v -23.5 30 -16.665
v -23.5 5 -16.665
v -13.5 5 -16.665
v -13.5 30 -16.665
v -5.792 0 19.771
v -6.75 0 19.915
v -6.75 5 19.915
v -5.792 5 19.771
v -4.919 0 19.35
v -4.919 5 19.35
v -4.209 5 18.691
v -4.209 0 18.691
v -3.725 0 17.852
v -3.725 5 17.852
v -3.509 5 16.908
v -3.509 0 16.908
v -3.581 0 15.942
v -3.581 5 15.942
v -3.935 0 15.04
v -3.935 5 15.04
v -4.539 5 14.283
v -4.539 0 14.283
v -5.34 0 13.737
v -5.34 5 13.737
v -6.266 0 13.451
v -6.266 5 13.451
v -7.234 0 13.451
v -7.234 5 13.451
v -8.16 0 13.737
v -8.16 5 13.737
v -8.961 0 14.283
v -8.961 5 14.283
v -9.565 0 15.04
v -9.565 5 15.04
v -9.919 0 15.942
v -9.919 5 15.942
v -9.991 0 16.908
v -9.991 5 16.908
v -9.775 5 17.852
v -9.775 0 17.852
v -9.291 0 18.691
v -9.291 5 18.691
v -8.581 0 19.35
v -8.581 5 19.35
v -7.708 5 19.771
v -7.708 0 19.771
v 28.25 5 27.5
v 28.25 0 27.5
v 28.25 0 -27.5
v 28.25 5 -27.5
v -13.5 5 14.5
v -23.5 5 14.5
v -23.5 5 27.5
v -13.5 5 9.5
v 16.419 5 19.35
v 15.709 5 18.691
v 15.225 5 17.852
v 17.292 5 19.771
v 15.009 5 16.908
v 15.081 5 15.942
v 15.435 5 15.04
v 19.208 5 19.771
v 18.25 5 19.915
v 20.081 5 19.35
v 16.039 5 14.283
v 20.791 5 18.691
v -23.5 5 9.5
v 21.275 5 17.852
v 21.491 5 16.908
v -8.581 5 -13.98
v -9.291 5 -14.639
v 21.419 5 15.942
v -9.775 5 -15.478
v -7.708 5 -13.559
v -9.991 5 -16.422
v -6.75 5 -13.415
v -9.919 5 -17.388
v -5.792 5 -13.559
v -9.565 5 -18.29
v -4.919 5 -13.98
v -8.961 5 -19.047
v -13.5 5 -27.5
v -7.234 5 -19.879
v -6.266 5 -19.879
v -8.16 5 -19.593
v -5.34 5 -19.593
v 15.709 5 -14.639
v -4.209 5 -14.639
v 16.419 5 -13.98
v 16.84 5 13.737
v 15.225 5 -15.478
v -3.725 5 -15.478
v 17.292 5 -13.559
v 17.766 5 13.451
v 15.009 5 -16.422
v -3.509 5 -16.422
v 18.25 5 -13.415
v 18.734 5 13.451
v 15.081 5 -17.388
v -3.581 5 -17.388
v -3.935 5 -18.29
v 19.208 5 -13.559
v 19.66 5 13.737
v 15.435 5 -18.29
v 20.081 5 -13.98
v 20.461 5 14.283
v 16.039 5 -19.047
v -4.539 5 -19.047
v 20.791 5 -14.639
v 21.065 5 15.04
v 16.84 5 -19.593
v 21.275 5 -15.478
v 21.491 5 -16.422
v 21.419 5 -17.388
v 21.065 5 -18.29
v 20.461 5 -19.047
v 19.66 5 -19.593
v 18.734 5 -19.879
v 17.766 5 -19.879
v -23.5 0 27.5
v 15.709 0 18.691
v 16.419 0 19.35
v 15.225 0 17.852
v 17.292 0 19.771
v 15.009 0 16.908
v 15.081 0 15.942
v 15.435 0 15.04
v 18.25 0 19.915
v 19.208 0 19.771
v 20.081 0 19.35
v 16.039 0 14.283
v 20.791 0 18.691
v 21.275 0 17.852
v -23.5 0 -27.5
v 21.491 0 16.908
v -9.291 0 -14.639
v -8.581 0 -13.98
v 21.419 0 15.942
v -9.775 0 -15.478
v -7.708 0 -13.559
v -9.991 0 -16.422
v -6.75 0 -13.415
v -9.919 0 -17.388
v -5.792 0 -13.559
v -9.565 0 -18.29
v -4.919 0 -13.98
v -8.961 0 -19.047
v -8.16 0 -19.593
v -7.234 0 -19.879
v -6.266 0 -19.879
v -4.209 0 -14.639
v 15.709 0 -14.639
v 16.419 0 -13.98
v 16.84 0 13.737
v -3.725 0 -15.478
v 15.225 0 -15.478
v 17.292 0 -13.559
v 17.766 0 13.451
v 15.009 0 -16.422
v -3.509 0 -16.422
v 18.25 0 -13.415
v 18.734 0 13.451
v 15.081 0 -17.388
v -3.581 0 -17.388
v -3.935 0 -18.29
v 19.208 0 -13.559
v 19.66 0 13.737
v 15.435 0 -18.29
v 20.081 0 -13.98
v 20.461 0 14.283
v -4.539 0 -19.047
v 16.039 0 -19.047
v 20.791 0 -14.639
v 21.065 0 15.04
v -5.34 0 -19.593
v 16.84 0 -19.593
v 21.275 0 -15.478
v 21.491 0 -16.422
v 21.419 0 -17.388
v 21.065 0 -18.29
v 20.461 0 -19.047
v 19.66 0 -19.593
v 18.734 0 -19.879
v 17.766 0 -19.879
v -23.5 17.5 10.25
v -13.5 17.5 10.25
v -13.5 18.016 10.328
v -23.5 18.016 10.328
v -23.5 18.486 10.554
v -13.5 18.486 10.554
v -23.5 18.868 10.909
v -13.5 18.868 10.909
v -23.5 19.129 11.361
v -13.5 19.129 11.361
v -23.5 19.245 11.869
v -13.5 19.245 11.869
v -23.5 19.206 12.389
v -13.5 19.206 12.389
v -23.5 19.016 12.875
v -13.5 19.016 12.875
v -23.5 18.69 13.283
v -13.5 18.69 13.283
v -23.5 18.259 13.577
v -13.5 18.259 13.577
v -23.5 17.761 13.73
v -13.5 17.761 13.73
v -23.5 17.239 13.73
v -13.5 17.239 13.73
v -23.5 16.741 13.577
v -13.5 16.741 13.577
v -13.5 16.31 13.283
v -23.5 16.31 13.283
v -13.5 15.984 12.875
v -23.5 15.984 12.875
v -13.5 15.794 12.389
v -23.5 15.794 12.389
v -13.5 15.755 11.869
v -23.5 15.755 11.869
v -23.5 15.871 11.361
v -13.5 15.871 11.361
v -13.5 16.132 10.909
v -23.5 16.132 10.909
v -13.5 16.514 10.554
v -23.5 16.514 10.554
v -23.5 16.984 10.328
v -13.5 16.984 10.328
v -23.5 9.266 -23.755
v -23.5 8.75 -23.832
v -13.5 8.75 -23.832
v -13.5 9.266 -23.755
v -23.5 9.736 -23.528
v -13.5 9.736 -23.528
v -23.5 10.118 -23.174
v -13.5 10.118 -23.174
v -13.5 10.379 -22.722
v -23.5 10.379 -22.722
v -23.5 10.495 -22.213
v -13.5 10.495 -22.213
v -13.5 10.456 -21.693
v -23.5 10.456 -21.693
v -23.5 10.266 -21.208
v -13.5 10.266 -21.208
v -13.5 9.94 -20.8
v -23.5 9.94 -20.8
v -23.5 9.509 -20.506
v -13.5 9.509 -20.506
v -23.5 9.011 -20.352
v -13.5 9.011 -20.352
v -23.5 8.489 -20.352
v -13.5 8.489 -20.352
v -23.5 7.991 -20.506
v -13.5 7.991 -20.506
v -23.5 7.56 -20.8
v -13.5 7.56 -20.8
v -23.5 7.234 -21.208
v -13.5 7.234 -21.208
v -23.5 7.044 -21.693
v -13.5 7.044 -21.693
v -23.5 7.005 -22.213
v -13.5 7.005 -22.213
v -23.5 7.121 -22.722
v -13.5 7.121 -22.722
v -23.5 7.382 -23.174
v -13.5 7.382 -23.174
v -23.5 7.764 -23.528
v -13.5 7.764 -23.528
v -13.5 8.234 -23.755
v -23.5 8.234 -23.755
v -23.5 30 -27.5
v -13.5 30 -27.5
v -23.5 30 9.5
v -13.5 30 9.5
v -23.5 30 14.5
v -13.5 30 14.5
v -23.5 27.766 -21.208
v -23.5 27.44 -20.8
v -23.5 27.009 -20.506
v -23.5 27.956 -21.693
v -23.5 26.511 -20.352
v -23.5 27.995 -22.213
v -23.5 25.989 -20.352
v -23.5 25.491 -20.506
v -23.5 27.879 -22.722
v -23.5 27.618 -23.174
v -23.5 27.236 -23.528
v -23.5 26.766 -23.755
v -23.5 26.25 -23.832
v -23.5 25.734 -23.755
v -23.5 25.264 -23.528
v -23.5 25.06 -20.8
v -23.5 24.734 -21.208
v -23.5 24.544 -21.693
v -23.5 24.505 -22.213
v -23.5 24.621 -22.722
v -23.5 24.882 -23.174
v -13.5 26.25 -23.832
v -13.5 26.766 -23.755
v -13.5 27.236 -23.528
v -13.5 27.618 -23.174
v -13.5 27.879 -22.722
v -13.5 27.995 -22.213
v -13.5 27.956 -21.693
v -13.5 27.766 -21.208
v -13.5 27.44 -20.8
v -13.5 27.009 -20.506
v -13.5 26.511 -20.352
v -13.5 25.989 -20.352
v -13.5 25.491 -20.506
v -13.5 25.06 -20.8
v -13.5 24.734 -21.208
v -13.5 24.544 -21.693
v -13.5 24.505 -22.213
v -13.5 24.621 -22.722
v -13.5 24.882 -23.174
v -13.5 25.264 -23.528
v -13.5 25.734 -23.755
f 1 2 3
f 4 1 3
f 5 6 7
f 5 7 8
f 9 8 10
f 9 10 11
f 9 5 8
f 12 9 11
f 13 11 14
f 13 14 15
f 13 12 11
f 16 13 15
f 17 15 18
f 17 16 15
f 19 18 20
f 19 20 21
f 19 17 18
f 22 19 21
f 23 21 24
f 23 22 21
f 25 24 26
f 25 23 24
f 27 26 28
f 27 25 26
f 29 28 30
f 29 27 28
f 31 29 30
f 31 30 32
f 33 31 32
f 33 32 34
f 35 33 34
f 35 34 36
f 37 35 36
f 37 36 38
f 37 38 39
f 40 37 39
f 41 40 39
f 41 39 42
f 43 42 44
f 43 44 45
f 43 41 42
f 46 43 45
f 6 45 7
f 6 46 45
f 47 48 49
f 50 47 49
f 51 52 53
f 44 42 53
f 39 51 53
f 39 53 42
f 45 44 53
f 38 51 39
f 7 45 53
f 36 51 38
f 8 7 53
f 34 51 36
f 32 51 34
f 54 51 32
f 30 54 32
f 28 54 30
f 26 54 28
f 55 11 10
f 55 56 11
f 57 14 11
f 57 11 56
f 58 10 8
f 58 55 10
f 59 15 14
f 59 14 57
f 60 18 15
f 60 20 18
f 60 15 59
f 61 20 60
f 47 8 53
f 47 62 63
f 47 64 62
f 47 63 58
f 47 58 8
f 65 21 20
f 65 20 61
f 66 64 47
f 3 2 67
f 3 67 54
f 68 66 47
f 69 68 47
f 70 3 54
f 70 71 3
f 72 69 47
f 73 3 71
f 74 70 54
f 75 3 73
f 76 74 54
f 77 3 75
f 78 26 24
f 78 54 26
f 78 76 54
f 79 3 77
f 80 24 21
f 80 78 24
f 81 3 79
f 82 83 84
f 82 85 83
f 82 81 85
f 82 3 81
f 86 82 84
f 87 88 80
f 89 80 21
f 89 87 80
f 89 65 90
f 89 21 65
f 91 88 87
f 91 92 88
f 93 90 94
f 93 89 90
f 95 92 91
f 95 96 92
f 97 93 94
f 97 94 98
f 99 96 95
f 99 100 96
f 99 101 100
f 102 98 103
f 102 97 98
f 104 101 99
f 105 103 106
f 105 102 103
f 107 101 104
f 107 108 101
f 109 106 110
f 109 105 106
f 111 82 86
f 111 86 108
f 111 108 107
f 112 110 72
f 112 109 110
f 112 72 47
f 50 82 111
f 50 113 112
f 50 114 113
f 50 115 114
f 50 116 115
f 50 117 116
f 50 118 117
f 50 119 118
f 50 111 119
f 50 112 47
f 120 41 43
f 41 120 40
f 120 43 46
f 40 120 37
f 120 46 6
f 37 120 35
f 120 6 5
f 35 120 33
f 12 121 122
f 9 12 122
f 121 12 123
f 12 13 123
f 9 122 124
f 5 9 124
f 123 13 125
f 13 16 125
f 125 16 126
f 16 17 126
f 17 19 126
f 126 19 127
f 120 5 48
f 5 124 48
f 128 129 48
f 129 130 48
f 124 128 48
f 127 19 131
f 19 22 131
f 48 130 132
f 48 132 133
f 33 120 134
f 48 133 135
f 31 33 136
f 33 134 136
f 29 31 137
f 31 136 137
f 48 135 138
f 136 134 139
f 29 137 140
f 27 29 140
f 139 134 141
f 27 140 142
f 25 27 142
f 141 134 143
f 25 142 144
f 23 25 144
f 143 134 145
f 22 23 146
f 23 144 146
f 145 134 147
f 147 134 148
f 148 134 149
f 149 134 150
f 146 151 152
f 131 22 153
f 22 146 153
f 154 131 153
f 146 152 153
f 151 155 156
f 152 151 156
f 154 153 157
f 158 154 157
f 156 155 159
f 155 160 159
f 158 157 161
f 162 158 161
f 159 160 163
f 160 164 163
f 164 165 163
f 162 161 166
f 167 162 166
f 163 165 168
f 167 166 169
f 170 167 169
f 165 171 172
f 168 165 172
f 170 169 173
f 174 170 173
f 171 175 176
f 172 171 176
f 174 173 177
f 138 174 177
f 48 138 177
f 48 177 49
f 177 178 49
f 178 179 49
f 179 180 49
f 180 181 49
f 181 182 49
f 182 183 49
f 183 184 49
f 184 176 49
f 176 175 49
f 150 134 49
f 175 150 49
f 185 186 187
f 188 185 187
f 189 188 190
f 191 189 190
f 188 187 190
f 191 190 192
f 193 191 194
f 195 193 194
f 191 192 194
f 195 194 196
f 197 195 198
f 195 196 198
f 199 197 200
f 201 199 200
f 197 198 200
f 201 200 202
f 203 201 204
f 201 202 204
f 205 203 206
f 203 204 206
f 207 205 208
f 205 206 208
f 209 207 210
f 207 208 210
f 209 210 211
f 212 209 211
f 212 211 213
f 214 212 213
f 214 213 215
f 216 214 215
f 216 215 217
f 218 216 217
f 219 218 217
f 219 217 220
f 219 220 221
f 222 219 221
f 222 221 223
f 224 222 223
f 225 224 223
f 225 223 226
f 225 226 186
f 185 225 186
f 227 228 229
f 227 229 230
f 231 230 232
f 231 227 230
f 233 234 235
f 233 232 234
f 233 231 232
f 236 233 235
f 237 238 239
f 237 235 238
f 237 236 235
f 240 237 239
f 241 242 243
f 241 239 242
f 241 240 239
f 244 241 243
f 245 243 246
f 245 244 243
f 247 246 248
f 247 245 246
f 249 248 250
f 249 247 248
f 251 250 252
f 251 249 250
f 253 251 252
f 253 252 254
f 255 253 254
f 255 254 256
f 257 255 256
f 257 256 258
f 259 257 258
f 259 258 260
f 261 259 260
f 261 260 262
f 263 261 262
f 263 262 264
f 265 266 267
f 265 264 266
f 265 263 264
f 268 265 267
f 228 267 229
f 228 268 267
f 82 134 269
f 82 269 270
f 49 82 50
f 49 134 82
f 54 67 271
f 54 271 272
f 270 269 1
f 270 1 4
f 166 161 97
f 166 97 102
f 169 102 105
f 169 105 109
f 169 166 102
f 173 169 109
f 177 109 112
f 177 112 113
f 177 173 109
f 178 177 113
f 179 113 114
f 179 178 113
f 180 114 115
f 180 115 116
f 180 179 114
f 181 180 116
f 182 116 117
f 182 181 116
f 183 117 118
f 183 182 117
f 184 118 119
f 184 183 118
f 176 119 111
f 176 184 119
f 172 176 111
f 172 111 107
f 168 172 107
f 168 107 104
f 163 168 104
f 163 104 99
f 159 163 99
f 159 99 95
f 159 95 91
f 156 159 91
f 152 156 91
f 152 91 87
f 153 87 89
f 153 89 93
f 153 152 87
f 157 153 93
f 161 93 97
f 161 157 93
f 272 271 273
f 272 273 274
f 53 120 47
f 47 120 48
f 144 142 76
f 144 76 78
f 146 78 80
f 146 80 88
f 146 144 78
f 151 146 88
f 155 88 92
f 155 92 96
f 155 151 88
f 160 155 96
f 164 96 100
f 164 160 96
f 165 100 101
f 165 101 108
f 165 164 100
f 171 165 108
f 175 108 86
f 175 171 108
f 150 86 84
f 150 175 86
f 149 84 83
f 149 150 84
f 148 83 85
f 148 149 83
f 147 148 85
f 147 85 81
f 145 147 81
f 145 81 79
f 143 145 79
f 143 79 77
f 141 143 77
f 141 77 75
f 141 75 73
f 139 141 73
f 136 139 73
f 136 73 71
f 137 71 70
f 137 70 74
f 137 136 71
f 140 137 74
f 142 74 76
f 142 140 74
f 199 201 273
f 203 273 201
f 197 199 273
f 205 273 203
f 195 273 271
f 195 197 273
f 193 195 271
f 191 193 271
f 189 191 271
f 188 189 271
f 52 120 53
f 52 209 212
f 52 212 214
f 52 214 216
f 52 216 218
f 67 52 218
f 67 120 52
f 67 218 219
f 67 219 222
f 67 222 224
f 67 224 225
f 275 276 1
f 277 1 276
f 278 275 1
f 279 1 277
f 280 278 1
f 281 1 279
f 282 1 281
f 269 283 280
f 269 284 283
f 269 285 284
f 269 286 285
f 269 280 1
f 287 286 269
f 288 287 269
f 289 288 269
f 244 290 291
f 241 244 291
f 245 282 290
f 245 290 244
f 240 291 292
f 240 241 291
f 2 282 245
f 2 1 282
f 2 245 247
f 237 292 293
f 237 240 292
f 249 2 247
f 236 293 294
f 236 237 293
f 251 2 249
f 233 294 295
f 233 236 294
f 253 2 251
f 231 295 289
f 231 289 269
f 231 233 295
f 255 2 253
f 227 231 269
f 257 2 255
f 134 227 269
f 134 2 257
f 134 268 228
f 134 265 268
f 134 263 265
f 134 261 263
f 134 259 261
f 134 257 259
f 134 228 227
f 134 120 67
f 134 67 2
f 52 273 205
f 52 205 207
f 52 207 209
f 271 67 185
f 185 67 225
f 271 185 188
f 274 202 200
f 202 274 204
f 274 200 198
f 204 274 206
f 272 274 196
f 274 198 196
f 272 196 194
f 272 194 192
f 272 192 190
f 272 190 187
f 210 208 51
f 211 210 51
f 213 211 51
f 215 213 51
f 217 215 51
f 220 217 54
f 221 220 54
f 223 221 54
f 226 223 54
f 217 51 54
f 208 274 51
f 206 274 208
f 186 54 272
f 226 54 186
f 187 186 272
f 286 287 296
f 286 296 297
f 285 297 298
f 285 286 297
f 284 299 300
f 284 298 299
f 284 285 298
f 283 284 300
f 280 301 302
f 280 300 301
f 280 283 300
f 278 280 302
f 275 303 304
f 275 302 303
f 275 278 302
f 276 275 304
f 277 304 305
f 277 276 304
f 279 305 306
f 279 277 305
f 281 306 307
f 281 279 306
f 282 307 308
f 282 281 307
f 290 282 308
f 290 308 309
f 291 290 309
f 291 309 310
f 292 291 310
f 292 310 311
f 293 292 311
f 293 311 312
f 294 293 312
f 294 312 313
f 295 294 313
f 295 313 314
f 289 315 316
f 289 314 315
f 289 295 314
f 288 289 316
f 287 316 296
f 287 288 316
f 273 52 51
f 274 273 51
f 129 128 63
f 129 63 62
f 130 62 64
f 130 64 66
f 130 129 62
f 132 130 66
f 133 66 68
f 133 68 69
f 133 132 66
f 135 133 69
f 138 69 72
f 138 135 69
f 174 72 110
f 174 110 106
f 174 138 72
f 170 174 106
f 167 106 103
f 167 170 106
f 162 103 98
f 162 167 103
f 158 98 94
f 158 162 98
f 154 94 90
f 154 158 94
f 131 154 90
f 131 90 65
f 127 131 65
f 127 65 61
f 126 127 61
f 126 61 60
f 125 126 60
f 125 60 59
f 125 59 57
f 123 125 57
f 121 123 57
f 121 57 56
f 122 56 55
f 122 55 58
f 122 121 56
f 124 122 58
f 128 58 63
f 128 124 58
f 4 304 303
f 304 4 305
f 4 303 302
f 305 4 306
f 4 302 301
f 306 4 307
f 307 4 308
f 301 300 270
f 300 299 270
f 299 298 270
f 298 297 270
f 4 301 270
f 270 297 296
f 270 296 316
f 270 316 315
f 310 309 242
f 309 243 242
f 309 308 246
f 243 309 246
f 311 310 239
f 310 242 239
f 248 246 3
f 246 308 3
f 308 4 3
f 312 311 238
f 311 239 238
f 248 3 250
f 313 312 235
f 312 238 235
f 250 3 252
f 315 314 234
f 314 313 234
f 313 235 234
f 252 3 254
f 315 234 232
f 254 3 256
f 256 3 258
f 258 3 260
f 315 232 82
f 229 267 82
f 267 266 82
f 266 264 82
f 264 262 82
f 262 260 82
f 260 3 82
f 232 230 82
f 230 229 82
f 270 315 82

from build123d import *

# Parameters (mm, degrees)
SKETCH1_W               = 51.75
SKETCH1_H               = 55
SKETCH1_R               = 3.25
BOSS_EXTRUDE2_DEPTH     = 5
SKETCH1_6_W             = 10
SKETCH1_6_H             = 10.835
SKETCH1_6_H_2           = 5
BOSS_EXTRUDE3_DEPTH     = 30
CUT_EXTRUDE1_DEPTH      = 59.303623387
CUT_EXTRUDE1_DEPTH_BACK = 59.303623387
SKETCH4_R               = 1.75
SKETCH3_R               = 1.75
CUT_EXTRUDE2_DEPTH      = 59.303623387


with BuildPart() as part:
    # Sketch1 → Boss-Extrude2 (new body)
    with BuildSketch(Plane(origin=(0, 0, 0), x_dir=(1, 0, 0), z_dir=(0, 1, 0))):
        with Locations((2.375, 0)):
            Rectangle(SKETCH1_W, SKETCH1_H)
        with Locations((18.25, 16.665)):
            Circle(SKETCH1_R, mode=Mode.SUBTRACT)
        with Locations((-6.75, -16.665)):
            Circle(SKETCH1_R, mode=Mode.SUBTRACT)
        with Locations((18.25, -16.665)):
            Circle(SKETCH1_R, mode=Mode.SUBTRACT)
        with Locations((-6.75, 16.665)):
            Circle(SKETCH1_R, mode=Mode.SUBTRACT)
    extrude(amount=BOSS_EXTRUDE2_DEPTH)

    # Sketch1<6> → Boss-Extrude3 (add)
    with BuildSketch(Plane(origin=(0, 0, 0), x_dir=(1, 0, 0), z_dir=(0, 1, 0))):
        with Locations((-18.5, 22.0825)):
            Rectangle(SKETCH1_6_W, SKETCH1_6_H)
        with Locations((-18.5, -12)):
            Rectangle(SKETCH1_6_W, SKETCH1_6_H_2)
    extrude(amount=BOSS_EXTRUDE3_DEPTH)

    # Sketch4 → Cut-Extrude1 (cut, two sides: drawn at the far end of the back side and taken through both)
    with BuildSketch(Plane(origin=(-13.5, 0, 0), x_dir=(0, 0, -1), z_dir=(1, 0, 0)).offset(-CUT_EXTRUDE1_DEPTH_BACK)):
        with Locations((22.0825, 26.25)):
            Circle(SKETCH4_R)
        with Locations((22.0825, 8.75)):
            Circle(SKETCH4_R)
    extrude(amount=CUT_EXTRUDE1_DEPTH + CUT_EXTRUDE1_DEPTH_BACK, mode=Mode.SUBTRACT)

    # Sketch3 → Cut-Extrude2 (cut, through all)
    with BuildSketch(Plane(origin=(-13.5, 0, 0), x_dir=(0, 0, -1), z_dir=(1, 0, 0))):
        with Locations((-12, 17.5)):
            Circle(SKETCH3_R)
    extrude(amount=-CUT_EXTRUDE2_DEPTH, mode=Mode.SUBTRACT)


solid = part.part
